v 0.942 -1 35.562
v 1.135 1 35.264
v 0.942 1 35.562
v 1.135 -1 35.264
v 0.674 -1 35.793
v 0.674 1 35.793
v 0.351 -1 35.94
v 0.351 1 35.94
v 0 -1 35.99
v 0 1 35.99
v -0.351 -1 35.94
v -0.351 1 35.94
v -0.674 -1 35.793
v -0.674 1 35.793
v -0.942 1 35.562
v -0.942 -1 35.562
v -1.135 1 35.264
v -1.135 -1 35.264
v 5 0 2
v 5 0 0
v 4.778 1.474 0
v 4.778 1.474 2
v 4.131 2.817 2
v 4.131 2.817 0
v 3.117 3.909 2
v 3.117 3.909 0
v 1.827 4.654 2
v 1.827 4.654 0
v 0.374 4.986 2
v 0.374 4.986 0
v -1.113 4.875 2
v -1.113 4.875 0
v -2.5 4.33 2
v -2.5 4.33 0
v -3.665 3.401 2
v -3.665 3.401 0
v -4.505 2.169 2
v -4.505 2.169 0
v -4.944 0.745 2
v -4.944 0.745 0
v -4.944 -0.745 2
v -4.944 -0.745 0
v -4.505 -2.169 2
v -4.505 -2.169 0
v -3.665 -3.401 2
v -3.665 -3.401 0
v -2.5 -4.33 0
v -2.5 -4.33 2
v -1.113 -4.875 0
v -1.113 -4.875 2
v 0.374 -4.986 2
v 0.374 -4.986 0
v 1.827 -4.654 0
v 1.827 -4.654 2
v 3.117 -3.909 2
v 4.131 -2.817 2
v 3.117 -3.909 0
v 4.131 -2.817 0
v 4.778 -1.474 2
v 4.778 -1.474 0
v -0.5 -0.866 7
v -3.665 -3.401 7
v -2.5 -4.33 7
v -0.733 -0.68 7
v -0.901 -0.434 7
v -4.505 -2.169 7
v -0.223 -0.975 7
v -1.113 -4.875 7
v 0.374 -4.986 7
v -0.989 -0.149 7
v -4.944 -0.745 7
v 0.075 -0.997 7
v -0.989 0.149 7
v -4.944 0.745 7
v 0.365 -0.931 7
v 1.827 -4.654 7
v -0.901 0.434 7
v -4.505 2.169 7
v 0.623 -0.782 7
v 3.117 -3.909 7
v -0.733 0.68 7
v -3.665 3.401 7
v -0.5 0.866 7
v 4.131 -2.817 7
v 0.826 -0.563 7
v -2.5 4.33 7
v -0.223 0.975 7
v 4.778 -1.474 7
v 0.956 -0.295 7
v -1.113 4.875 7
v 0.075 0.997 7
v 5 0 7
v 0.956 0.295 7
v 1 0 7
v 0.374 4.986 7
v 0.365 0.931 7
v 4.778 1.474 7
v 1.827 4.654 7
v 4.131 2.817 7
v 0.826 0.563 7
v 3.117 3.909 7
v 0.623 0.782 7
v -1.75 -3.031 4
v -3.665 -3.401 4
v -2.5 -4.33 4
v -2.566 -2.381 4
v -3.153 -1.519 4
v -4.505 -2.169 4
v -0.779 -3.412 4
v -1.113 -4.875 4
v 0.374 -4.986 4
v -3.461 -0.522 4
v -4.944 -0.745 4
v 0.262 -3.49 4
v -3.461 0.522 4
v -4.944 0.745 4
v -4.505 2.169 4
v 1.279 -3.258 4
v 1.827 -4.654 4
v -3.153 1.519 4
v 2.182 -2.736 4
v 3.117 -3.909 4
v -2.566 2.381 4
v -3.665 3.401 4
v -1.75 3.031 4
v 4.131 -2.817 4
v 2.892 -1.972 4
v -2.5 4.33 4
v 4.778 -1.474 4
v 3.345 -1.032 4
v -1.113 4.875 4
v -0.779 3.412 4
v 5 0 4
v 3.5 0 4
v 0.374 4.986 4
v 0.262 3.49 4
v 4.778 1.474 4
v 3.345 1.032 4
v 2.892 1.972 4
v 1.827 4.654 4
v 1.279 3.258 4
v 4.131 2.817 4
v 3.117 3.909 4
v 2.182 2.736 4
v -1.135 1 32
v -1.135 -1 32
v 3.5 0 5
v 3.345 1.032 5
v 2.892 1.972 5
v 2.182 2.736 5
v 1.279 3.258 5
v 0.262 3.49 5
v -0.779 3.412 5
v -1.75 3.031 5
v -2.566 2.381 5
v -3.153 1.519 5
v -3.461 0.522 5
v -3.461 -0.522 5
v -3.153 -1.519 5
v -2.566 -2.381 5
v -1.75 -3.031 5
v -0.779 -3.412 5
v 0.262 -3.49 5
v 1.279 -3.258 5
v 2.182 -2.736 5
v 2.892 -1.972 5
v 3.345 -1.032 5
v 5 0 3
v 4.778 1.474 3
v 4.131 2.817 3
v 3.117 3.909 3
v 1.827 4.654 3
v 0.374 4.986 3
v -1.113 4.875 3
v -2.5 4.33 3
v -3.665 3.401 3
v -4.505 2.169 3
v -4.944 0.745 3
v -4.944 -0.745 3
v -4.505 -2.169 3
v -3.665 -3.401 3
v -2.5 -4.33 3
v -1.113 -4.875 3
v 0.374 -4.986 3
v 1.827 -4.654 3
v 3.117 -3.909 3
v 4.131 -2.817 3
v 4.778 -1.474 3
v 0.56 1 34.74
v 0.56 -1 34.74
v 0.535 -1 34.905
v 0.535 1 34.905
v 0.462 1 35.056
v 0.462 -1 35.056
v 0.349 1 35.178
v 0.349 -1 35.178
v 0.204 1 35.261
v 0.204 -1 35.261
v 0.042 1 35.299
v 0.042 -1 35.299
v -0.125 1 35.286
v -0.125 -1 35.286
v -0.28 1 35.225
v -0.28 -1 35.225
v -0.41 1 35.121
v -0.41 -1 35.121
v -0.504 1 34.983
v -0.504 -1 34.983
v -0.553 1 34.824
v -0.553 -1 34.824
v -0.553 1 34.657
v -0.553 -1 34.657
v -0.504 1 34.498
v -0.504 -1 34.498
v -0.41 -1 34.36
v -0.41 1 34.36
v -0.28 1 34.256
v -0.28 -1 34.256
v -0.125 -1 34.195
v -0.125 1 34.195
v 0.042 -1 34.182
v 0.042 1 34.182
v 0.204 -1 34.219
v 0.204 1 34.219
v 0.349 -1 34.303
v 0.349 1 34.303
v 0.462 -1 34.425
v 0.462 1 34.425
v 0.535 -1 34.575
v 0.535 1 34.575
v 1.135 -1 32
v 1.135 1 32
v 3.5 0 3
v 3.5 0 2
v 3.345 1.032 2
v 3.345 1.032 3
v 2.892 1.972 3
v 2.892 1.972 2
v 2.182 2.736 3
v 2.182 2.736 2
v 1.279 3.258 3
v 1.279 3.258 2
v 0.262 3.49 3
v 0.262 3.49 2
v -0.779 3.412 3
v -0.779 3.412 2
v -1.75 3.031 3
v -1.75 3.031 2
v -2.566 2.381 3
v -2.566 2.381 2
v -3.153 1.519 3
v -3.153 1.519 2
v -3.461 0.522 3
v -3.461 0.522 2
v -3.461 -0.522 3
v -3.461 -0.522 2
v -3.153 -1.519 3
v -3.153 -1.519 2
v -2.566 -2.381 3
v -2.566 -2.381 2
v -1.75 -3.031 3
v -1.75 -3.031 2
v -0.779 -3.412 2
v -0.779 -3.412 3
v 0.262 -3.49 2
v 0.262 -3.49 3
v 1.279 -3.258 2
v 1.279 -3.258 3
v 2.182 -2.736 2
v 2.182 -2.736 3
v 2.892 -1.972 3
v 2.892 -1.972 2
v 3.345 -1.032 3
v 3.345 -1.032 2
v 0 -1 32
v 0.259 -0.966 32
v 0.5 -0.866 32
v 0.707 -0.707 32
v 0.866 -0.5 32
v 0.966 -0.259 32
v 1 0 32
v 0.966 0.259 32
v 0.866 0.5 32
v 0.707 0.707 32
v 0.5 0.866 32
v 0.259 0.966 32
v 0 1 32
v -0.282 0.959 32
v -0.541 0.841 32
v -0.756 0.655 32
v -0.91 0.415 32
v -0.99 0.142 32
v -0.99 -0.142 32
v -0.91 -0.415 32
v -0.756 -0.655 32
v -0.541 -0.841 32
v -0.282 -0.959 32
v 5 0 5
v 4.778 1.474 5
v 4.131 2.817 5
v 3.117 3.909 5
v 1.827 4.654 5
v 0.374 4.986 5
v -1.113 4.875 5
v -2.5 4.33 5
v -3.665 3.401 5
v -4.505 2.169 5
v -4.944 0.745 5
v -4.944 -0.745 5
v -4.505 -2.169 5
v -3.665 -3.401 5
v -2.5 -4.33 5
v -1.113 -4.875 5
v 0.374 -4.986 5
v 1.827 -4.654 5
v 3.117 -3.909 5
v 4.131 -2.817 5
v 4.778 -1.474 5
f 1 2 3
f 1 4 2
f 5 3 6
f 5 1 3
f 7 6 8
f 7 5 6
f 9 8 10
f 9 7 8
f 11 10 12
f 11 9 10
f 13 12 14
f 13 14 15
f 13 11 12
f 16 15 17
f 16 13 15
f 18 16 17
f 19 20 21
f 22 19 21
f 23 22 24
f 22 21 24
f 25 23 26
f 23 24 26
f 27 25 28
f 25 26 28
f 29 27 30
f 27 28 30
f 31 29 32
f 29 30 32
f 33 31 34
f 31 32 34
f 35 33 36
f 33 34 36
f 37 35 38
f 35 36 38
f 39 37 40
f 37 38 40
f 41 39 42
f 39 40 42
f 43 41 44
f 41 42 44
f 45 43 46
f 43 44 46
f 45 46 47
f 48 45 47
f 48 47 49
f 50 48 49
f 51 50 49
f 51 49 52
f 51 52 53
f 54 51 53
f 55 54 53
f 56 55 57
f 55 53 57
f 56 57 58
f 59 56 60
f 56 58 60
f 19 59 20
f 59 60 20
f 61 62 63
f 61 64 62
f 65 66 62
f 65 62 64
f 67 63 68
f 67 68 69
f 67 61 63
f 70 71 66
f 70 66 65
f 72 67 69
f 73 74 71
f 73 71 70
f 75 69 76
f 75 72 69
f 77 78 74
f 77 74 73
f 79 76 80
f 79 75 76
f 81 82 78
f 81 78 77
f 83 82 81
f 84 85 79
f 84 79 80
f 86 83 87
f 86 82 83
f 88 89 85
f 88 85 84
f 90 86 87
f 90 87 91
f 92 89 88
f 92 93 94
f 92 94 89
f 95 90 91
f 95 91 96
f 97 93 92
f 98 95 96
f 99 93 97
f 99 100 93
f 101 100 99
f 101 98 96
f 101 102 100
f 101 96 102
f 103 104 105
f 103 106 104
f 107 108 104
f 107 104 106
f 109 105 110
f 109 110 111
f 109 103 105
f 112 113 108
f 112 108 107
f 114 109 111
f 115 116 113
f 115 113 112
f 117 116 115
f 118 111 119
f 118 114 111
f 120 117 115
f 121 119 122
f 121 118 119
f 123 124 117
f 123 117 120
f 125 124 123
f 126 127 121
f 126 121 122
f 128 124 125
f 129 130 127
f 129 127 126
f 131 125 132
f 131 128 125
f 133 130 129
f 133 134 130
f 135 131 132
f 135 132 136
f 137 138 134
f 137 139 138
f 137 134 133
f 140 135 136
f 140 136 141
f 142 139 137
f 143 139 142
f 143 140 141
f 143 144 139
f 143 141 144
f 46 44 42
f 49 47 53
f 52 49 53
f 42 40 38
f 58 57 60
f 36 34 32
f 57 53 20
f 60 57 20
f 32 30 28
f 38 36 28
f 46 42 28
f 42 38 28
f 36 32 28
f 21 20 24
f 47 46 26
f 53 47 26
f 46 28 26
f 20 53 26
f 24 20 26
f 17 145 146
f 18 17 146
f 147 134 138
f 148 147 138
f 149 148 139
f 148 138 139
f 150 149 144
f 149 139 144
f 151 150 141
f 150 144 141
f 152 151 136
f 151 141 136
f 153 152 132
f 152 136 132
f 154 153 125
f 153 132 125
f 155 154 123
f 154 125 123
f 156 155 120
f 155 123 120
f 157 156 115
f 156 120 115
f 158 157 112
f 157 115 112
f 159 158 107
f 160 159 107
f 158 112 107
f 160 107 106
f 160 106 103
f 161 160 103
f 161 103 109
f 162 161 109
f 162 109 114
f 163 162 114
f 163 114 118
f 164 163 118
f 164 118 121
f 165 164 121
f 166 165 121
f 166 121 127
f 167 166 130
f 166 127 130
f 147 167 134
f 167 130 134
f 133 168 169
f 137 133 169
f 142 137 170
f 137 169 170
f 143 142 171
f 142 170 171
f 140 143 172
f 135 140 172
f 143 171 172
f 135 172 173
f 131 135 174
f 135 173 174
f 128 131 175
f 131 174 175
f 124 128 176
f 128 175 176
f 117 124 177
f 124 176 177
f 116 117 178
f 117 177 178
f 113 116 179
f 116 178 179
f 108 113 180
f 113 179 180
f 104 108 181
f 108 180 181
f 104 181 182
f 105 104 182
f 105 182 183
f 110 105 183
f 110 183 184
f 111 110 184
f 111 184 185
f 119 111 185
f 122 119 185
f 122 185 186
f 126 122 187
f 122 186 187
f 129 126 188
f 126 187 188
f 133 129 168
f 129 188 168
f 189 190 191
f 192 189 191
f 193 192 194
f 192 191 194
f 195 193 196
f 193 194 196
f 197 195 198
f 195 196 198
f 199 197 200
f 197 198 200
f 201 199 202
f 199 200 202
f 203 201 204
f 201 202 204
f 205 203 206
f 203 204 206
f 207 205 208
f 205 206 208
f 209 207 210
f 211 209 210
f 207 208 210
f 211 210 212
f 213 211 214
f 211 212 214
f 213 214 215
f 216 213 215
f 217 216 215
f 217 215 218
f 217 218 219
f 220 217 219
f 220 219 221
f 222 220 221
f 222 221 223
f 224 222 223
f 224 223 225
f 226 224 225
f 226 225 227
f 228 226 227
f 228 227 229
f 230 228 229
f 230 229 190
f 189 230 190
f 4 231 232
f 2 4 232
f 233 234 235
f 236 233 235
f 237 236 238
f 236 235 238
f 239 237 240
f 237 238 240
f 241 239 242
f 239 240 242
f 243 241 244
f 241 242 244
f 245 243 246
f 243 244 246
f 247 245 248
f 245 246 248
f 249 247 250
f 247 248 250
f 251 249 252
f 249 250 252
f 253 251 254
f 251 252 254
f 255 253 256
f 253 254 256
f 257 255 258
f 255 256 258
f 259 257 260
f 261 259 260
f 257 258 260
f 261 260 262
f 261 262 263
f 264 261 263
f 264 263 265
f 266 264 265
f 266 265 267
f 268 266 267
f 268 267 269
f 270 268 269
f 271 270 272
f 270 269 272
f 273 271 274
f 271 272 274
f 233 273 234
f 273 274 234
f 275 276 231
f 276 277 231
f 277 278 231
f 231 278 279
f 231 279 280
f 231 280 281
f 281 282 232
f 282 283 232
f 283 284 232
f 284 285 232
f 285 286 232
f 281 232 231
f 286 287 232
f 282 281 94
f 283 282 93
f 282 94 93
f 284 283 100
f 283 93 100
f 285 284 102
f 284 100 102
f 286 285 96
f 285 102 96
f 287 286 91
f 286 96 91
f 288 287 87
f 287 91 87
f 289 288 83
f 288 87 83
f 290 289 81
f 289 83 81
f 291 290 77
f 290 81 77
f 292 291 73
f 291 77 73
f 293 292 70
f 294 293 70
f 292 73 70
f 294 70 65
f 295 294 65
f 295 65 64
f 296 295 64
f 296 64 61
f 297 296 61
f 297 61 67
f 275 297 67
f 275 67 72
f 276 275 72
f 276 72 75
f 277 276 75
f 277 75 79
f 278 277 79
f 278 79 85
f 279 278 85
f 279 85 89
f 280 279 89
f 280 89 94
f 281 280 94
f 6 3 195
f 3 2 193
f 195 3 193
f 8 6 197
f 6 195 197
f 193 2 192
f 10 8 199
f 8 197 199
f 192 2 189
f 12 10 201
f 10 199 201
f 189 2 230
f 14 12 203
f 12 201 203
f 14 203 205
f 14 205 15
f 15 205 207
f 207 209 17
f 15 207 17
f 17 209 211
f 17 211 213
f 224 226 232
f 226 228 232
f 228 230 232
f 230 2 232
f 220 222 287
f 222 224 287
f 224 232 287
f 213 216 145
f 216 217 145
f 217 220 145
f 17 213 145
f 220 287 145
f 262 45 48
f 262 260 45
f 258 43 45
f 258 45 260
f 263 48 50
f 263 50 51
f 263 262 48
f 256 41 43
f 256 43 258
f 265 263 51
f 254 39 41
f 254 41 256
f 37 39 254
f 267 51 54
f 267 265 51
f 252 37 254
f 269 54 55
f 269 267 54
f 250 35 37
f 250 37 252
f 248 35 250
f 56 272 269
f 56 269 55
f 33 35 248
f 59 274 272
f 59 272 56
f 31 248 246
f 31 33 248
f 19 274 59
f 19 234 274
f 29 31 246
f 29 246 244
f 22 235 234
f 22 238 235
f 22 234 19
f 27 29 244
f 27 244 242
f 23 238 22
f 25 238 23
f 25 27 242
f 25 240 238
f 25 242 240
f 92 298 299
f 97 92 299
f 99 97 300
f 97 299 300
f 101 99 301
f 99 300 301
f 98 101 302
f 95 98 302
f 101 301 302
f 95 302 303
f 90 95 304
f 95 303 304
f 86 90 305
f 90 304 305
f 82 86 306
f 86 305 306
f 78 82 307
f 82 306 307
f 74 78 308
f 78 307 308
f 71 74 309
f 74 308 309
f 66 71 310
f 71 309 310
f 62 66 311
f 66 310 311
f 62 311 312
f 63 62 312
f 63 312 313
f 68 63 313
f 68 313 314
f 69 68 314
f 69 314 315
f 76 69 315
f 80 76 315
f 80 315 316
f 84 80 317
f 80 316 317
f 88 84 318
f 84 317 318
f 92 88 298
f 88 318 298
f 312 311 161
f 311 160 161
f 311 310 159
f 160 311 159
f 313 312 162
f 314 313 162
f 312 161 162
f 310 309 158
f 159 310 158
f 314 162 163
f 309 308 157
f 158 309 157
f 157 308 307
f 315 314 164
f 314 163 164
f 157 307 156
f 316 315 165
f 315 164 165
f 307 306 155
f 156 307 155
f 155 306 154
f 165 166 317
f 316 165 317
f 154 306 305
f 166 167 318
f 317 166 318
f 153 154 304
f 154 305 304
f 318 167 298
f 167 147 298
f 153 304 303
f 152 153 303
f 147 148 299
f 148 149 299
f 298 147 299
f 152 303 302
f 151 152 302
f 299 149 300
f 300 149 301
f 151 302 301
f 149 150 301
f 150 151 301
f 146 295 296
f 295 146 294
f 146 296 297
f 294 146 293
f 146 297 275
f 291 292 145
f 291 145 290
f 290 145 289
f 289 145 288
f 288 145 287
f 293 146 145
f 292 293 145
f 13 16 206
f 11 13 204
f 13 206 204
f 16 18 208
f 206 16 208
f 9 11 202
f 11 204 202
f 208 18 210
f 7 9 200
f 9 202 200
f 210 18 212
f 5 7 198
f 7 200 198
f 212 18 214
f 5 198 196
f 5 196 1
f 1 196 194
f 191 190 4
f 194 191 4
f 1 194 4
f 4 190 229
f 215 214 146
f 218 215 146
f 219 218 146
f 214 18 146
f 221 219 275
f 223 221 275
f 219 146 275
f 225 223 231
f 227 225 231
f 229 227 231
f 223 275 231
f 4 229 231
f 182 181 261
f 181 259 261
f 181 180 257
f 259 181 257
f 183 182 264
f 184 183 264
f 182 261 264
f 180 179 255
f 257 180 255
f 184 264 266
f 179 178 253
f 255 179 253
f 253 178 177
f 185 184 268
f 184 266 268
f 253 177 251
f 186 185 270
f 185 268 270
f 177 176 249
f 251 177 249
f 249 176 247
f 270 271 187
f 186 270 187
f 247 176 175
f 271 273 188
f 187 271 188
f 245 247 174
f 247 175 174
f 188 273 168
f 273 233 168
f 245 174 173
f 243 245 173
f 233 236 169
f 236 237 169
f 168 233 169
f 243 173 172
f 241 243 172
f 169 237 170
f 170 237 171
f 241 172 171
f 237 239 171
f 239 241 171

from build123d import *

# Parameters (mm, degrees)
F0_R      = 5
F1_DEPTH  = 2
F2_R      = 3.5
F3_DEPTH  = 1
F4_R      = 5
F4_R_2    = 3.5
F5_DEPTH  = 1
F6_R      = 3.5
F7_DEPTH  = 1
F8_R      = 5
F8_R_2    = 3.5
F9_DEPTH  = 2
F10_R     = 1
F11_DEPTH = 25
F13_DEPTH = 4
F15_DEPTH = 12.5
F16_R     = 0.5596686964
F17_DEPTH = 25


with BuildPart() as f1:
    # F0 (on Top) → F1 (new body)
    with BuildSketch(Plane.XY):
        Circle(F0_R)
    extrude(amount=F1_DEPTH)

    # F2 (on face) → F3 (join)
    with BuildSketch(Plane.XY.offset(2)):
        Circle(F2_R)
    extrude(amount=F3_DEPTH)

    # F4 (on face) → F5 (join)
    with BuildSketch(Plane.XY.offset(3)):
        Circle(F4_R)
        Circle(F4_R_2, mode=Mode.SUBTRACT)
        Circle(F4_R_2)
    extrude(amount=F5_DEPTH)

    # F6 (on face) → F7 (join)
    with BuildSketch(Plane.XY.offset(4)):
        Circle(F6_R)
    extrude(amount=F7_DEPTH)

    # F8 (on face) → F9 (join)
    with BuildSketch(Plane.XY.offset(5)):
        Circle(F8_R)
        Circle(F8_R_2, mode=Mode.SUBTRACT)
        Circle(F8_R_2)
    extrude(amount=F9_DEPTH)

    # F10 (on face) → F11 (join)
    with BuildSketch(Plane.XY.offset(7)):
        Circle(F10_R)
    extrude(amount=F11_DEPTH)

    # F12 (on face) → F13 (join)
    with BuildSketch(Plane.XY.offset(32)):
        with BuildLine():
            Line((1.1349343348, 1), (0, 1))
            ThreePointArc((0, 1), (0.7071067812, 0.7071067812), (1, 0))
            ThreePointArc((1, 0), (0.7071067812, -0.7071067812), (0, -1))
            Line((0, -1), (1.1349343348, -1))
            Line((1.1349343348, -1), (1.1349343348, 1))
        make_face()
        with BuildLine():
            Line((0, 1), (-1.1349343348, 1))
            Line((-1.1349343348, 1), (-1.1349343348, -1))
            Line((-1.1349343348, -1), (0, -1))
            ThreePointArc((0, -1), (-1, 0), (0, 1))
        make_face()
        with BuildLine():
            ThreePointArc((1, 0), (0.7071067812, 0.7071067812), (0, 1))
            ThreePointArc((0, 1), (-1, 0), (0, -1))
            ThreePointArc((0, -1), (0.7071067812, -0.7071067812), (1, 0))
        make_face()
    extrude(amount=F13_DEPTH)

    # F14 (on face) → F15 (intersect, symmetric)
    with BuildSketch(Plane.XZ.offset(1)):
        with BuildLine():
            Line((1.2498749086, 32), (1.2498749086, 34.7227233296))
            ThreePointArc((1.2498749086, 34.7227233296), (1.2227611454, 34.9999357877), (1.1349343348, 35.2642620149))
            Line((1.1349343348, 35.2642620149), (1.1349343348, 32))
            Line((1.1349343348, 32), (0, 32))
            Line((0, 32), (-1.1349343348, 32))
            Line((-1.1349343348, 32), (-11.0570155084, -1.4946558513))
            Line((-11.0570155084, -1.4946558513), (-0.2573039092, -3.1720956322))
            Line((-0.2573039092, -3.1720956322), (14.6179525182, 0.9926037164))
            Line((14.6179525182, 0.9926037164), (6.6368887201, 14.4441844895))
            Line((6.6368887201, 14.4441844895), (1.2498749086, 32))
        make_face()
        with BuildLine():
            Line((1.1349343348, 32), (1.1349343348, 35.2642620149))
            ThreePointArc((1.1349343348, 35.2642620149), (0, 35.9904070199), (-1.1349343348, 35.2642620149))
            Line((-1.1349343348, 35.2642620149), (-1.1349343348, 32))
            Line((-1.1349343348, 32), (0, 32))
            Line((0, 32), (1.1349343348, 32))
        make_face()
    extrude(amount=F15_DEPTH, both=True, mode=Mode.INTERSECT)

    # F16 (on face) → F17 (cut)
    with BuildSketch(Plane.XZ.offset(1)):
        with Locations((0, 34.7404070199)):
            Circle(F16_R)
    extrude(amount=-F17_DEPTH, mode=Mode.SUBTRACT)


solid = f1.part
